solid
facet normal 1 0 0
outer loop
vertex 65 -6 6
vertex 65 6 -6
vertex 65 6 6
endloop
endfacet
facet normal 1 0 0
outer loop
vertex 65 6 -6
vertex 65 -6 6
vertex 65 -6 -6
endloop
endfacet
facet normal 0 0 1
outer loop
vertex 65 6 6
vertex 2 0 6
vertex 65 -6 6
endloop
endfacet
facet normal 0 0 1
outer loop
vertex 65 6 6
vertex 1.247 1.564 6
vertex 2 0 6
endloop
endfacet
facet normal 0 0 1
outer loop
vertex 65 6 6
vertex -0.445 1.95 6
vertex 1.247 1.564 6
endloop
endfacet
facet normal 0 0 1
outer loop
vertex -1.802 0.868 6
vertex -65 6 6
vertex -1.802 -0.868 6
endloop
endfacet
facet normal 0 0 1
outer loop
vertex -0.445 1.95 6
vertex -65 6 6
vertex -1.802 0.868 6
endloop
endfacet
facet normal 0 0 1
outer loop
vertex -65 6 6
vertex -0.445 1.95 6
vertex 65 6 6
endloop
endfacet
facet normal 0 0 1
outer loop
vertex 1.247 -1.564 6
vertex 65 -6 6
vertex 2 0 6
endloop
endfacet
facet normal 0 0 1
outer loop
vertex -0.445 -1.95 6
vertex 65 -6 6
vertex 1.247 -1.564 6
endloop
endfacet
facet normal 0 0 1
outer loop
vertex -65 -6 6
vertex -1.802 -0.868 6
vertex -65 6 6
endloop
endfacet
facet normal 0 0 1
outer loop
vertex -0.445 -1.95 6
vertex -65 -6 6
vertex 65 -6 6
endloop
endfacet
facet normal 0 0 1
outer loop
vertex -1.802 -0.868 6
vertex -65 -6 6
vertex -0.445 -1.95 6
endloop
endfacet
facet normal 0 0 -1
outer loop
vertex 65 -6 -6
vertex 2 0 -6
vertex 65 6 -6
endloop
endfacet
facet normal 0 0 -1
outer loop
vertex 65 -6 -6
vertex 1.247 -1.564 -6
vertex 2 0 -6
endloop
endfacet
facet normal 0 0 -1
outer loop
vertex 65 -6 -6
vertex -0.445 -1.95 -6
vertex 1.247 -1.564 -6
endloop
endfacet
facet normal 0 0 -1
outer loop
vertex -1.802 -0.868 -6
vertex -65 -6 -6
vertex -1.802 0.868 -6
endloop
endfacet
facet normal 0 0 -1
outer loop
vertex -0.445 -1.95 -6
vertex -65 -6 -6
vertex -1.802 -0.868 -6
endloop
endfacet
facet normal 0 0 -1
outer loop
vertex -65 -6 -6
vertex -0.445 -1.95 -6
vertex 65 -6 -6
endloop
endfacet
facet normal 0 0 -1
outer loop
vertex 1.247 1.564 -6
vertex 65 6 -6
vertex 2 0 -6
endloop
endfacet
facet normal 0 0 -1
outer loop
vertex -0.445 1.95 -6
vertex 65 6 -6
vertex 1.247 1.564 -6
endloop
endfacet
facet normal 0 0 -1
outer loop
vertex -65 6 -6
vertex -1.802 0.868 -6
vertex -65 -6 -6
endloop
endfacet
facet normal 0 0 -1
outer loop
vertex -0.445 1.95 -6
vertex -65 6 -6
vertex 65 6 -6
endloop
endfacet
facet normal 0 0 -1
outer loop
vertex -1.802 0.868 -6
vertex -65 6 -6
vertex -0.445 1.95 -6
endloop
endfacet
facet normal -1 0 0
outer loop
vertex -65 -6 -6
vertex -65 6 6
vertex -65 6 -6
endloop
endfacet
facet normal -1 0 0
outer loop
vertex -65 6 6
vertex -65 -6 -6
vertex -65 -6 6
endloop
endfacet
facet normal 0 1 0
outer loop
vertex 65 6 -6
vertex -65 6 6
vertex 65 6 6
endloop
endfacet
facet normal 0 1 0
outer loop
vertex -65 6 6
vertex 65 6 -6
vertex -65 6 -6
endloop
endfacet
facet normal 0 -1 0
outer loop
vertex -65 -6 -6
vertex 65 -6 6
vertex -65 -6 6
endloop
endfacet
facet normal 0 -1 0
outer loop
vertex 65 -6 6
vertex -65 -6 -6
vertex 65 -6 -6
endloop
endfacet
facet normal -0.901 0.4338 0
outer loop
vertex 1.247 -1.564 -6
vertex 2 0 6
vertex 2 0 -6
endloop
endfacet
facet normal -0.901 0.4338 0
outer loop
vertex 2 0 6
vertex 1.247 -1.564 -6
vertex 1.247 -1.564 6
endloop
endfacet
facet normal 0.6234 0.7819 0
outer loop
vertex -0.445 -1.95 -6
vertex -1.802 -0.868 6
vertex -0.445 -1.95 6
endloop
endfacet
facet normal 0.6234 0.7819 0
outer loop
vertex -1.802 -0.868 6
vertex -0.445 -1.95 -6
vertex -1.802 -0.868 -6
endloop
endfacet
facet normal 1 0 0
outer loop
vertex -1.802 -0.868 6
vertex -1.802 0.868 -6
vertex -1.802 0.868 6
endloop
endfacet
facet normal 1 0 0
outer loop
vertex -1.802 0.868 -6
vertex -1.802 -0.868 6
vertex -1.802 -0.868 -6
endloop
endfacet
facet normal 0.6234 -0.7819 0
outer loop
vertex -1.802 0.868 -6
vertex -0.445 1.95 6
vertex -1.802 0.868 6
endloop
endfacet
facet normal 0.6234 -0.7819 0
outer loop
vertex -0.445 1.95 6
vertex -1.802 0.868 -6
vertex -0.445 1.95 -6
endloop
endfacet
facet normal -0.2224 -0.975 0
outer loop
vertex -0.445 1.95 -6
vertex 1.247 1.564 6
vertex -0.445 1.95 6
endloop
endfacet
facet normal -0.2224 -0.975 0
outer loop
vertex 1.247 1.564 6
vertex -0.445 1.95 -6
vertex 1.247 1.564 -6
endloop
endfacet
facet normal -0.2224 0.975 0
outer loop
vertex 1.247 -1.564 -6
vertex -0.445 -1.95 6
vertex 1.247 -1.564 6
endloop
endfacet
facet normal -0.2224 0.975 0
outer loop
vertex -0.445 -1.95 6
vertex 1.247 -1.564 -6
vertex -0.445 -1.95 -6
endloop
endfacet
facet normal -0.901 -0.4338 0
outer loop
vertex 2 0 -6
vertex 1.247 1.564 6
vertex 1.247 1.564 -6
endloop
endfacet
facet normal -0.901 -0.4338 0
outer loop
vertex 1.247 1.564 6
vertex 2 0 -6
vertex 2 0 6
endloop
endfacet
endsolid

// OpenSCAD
difference(){
    cube([128+2,12,12],true);
    linear_extrude(12+2,center=true){
        circle(d=4);
    }
}
